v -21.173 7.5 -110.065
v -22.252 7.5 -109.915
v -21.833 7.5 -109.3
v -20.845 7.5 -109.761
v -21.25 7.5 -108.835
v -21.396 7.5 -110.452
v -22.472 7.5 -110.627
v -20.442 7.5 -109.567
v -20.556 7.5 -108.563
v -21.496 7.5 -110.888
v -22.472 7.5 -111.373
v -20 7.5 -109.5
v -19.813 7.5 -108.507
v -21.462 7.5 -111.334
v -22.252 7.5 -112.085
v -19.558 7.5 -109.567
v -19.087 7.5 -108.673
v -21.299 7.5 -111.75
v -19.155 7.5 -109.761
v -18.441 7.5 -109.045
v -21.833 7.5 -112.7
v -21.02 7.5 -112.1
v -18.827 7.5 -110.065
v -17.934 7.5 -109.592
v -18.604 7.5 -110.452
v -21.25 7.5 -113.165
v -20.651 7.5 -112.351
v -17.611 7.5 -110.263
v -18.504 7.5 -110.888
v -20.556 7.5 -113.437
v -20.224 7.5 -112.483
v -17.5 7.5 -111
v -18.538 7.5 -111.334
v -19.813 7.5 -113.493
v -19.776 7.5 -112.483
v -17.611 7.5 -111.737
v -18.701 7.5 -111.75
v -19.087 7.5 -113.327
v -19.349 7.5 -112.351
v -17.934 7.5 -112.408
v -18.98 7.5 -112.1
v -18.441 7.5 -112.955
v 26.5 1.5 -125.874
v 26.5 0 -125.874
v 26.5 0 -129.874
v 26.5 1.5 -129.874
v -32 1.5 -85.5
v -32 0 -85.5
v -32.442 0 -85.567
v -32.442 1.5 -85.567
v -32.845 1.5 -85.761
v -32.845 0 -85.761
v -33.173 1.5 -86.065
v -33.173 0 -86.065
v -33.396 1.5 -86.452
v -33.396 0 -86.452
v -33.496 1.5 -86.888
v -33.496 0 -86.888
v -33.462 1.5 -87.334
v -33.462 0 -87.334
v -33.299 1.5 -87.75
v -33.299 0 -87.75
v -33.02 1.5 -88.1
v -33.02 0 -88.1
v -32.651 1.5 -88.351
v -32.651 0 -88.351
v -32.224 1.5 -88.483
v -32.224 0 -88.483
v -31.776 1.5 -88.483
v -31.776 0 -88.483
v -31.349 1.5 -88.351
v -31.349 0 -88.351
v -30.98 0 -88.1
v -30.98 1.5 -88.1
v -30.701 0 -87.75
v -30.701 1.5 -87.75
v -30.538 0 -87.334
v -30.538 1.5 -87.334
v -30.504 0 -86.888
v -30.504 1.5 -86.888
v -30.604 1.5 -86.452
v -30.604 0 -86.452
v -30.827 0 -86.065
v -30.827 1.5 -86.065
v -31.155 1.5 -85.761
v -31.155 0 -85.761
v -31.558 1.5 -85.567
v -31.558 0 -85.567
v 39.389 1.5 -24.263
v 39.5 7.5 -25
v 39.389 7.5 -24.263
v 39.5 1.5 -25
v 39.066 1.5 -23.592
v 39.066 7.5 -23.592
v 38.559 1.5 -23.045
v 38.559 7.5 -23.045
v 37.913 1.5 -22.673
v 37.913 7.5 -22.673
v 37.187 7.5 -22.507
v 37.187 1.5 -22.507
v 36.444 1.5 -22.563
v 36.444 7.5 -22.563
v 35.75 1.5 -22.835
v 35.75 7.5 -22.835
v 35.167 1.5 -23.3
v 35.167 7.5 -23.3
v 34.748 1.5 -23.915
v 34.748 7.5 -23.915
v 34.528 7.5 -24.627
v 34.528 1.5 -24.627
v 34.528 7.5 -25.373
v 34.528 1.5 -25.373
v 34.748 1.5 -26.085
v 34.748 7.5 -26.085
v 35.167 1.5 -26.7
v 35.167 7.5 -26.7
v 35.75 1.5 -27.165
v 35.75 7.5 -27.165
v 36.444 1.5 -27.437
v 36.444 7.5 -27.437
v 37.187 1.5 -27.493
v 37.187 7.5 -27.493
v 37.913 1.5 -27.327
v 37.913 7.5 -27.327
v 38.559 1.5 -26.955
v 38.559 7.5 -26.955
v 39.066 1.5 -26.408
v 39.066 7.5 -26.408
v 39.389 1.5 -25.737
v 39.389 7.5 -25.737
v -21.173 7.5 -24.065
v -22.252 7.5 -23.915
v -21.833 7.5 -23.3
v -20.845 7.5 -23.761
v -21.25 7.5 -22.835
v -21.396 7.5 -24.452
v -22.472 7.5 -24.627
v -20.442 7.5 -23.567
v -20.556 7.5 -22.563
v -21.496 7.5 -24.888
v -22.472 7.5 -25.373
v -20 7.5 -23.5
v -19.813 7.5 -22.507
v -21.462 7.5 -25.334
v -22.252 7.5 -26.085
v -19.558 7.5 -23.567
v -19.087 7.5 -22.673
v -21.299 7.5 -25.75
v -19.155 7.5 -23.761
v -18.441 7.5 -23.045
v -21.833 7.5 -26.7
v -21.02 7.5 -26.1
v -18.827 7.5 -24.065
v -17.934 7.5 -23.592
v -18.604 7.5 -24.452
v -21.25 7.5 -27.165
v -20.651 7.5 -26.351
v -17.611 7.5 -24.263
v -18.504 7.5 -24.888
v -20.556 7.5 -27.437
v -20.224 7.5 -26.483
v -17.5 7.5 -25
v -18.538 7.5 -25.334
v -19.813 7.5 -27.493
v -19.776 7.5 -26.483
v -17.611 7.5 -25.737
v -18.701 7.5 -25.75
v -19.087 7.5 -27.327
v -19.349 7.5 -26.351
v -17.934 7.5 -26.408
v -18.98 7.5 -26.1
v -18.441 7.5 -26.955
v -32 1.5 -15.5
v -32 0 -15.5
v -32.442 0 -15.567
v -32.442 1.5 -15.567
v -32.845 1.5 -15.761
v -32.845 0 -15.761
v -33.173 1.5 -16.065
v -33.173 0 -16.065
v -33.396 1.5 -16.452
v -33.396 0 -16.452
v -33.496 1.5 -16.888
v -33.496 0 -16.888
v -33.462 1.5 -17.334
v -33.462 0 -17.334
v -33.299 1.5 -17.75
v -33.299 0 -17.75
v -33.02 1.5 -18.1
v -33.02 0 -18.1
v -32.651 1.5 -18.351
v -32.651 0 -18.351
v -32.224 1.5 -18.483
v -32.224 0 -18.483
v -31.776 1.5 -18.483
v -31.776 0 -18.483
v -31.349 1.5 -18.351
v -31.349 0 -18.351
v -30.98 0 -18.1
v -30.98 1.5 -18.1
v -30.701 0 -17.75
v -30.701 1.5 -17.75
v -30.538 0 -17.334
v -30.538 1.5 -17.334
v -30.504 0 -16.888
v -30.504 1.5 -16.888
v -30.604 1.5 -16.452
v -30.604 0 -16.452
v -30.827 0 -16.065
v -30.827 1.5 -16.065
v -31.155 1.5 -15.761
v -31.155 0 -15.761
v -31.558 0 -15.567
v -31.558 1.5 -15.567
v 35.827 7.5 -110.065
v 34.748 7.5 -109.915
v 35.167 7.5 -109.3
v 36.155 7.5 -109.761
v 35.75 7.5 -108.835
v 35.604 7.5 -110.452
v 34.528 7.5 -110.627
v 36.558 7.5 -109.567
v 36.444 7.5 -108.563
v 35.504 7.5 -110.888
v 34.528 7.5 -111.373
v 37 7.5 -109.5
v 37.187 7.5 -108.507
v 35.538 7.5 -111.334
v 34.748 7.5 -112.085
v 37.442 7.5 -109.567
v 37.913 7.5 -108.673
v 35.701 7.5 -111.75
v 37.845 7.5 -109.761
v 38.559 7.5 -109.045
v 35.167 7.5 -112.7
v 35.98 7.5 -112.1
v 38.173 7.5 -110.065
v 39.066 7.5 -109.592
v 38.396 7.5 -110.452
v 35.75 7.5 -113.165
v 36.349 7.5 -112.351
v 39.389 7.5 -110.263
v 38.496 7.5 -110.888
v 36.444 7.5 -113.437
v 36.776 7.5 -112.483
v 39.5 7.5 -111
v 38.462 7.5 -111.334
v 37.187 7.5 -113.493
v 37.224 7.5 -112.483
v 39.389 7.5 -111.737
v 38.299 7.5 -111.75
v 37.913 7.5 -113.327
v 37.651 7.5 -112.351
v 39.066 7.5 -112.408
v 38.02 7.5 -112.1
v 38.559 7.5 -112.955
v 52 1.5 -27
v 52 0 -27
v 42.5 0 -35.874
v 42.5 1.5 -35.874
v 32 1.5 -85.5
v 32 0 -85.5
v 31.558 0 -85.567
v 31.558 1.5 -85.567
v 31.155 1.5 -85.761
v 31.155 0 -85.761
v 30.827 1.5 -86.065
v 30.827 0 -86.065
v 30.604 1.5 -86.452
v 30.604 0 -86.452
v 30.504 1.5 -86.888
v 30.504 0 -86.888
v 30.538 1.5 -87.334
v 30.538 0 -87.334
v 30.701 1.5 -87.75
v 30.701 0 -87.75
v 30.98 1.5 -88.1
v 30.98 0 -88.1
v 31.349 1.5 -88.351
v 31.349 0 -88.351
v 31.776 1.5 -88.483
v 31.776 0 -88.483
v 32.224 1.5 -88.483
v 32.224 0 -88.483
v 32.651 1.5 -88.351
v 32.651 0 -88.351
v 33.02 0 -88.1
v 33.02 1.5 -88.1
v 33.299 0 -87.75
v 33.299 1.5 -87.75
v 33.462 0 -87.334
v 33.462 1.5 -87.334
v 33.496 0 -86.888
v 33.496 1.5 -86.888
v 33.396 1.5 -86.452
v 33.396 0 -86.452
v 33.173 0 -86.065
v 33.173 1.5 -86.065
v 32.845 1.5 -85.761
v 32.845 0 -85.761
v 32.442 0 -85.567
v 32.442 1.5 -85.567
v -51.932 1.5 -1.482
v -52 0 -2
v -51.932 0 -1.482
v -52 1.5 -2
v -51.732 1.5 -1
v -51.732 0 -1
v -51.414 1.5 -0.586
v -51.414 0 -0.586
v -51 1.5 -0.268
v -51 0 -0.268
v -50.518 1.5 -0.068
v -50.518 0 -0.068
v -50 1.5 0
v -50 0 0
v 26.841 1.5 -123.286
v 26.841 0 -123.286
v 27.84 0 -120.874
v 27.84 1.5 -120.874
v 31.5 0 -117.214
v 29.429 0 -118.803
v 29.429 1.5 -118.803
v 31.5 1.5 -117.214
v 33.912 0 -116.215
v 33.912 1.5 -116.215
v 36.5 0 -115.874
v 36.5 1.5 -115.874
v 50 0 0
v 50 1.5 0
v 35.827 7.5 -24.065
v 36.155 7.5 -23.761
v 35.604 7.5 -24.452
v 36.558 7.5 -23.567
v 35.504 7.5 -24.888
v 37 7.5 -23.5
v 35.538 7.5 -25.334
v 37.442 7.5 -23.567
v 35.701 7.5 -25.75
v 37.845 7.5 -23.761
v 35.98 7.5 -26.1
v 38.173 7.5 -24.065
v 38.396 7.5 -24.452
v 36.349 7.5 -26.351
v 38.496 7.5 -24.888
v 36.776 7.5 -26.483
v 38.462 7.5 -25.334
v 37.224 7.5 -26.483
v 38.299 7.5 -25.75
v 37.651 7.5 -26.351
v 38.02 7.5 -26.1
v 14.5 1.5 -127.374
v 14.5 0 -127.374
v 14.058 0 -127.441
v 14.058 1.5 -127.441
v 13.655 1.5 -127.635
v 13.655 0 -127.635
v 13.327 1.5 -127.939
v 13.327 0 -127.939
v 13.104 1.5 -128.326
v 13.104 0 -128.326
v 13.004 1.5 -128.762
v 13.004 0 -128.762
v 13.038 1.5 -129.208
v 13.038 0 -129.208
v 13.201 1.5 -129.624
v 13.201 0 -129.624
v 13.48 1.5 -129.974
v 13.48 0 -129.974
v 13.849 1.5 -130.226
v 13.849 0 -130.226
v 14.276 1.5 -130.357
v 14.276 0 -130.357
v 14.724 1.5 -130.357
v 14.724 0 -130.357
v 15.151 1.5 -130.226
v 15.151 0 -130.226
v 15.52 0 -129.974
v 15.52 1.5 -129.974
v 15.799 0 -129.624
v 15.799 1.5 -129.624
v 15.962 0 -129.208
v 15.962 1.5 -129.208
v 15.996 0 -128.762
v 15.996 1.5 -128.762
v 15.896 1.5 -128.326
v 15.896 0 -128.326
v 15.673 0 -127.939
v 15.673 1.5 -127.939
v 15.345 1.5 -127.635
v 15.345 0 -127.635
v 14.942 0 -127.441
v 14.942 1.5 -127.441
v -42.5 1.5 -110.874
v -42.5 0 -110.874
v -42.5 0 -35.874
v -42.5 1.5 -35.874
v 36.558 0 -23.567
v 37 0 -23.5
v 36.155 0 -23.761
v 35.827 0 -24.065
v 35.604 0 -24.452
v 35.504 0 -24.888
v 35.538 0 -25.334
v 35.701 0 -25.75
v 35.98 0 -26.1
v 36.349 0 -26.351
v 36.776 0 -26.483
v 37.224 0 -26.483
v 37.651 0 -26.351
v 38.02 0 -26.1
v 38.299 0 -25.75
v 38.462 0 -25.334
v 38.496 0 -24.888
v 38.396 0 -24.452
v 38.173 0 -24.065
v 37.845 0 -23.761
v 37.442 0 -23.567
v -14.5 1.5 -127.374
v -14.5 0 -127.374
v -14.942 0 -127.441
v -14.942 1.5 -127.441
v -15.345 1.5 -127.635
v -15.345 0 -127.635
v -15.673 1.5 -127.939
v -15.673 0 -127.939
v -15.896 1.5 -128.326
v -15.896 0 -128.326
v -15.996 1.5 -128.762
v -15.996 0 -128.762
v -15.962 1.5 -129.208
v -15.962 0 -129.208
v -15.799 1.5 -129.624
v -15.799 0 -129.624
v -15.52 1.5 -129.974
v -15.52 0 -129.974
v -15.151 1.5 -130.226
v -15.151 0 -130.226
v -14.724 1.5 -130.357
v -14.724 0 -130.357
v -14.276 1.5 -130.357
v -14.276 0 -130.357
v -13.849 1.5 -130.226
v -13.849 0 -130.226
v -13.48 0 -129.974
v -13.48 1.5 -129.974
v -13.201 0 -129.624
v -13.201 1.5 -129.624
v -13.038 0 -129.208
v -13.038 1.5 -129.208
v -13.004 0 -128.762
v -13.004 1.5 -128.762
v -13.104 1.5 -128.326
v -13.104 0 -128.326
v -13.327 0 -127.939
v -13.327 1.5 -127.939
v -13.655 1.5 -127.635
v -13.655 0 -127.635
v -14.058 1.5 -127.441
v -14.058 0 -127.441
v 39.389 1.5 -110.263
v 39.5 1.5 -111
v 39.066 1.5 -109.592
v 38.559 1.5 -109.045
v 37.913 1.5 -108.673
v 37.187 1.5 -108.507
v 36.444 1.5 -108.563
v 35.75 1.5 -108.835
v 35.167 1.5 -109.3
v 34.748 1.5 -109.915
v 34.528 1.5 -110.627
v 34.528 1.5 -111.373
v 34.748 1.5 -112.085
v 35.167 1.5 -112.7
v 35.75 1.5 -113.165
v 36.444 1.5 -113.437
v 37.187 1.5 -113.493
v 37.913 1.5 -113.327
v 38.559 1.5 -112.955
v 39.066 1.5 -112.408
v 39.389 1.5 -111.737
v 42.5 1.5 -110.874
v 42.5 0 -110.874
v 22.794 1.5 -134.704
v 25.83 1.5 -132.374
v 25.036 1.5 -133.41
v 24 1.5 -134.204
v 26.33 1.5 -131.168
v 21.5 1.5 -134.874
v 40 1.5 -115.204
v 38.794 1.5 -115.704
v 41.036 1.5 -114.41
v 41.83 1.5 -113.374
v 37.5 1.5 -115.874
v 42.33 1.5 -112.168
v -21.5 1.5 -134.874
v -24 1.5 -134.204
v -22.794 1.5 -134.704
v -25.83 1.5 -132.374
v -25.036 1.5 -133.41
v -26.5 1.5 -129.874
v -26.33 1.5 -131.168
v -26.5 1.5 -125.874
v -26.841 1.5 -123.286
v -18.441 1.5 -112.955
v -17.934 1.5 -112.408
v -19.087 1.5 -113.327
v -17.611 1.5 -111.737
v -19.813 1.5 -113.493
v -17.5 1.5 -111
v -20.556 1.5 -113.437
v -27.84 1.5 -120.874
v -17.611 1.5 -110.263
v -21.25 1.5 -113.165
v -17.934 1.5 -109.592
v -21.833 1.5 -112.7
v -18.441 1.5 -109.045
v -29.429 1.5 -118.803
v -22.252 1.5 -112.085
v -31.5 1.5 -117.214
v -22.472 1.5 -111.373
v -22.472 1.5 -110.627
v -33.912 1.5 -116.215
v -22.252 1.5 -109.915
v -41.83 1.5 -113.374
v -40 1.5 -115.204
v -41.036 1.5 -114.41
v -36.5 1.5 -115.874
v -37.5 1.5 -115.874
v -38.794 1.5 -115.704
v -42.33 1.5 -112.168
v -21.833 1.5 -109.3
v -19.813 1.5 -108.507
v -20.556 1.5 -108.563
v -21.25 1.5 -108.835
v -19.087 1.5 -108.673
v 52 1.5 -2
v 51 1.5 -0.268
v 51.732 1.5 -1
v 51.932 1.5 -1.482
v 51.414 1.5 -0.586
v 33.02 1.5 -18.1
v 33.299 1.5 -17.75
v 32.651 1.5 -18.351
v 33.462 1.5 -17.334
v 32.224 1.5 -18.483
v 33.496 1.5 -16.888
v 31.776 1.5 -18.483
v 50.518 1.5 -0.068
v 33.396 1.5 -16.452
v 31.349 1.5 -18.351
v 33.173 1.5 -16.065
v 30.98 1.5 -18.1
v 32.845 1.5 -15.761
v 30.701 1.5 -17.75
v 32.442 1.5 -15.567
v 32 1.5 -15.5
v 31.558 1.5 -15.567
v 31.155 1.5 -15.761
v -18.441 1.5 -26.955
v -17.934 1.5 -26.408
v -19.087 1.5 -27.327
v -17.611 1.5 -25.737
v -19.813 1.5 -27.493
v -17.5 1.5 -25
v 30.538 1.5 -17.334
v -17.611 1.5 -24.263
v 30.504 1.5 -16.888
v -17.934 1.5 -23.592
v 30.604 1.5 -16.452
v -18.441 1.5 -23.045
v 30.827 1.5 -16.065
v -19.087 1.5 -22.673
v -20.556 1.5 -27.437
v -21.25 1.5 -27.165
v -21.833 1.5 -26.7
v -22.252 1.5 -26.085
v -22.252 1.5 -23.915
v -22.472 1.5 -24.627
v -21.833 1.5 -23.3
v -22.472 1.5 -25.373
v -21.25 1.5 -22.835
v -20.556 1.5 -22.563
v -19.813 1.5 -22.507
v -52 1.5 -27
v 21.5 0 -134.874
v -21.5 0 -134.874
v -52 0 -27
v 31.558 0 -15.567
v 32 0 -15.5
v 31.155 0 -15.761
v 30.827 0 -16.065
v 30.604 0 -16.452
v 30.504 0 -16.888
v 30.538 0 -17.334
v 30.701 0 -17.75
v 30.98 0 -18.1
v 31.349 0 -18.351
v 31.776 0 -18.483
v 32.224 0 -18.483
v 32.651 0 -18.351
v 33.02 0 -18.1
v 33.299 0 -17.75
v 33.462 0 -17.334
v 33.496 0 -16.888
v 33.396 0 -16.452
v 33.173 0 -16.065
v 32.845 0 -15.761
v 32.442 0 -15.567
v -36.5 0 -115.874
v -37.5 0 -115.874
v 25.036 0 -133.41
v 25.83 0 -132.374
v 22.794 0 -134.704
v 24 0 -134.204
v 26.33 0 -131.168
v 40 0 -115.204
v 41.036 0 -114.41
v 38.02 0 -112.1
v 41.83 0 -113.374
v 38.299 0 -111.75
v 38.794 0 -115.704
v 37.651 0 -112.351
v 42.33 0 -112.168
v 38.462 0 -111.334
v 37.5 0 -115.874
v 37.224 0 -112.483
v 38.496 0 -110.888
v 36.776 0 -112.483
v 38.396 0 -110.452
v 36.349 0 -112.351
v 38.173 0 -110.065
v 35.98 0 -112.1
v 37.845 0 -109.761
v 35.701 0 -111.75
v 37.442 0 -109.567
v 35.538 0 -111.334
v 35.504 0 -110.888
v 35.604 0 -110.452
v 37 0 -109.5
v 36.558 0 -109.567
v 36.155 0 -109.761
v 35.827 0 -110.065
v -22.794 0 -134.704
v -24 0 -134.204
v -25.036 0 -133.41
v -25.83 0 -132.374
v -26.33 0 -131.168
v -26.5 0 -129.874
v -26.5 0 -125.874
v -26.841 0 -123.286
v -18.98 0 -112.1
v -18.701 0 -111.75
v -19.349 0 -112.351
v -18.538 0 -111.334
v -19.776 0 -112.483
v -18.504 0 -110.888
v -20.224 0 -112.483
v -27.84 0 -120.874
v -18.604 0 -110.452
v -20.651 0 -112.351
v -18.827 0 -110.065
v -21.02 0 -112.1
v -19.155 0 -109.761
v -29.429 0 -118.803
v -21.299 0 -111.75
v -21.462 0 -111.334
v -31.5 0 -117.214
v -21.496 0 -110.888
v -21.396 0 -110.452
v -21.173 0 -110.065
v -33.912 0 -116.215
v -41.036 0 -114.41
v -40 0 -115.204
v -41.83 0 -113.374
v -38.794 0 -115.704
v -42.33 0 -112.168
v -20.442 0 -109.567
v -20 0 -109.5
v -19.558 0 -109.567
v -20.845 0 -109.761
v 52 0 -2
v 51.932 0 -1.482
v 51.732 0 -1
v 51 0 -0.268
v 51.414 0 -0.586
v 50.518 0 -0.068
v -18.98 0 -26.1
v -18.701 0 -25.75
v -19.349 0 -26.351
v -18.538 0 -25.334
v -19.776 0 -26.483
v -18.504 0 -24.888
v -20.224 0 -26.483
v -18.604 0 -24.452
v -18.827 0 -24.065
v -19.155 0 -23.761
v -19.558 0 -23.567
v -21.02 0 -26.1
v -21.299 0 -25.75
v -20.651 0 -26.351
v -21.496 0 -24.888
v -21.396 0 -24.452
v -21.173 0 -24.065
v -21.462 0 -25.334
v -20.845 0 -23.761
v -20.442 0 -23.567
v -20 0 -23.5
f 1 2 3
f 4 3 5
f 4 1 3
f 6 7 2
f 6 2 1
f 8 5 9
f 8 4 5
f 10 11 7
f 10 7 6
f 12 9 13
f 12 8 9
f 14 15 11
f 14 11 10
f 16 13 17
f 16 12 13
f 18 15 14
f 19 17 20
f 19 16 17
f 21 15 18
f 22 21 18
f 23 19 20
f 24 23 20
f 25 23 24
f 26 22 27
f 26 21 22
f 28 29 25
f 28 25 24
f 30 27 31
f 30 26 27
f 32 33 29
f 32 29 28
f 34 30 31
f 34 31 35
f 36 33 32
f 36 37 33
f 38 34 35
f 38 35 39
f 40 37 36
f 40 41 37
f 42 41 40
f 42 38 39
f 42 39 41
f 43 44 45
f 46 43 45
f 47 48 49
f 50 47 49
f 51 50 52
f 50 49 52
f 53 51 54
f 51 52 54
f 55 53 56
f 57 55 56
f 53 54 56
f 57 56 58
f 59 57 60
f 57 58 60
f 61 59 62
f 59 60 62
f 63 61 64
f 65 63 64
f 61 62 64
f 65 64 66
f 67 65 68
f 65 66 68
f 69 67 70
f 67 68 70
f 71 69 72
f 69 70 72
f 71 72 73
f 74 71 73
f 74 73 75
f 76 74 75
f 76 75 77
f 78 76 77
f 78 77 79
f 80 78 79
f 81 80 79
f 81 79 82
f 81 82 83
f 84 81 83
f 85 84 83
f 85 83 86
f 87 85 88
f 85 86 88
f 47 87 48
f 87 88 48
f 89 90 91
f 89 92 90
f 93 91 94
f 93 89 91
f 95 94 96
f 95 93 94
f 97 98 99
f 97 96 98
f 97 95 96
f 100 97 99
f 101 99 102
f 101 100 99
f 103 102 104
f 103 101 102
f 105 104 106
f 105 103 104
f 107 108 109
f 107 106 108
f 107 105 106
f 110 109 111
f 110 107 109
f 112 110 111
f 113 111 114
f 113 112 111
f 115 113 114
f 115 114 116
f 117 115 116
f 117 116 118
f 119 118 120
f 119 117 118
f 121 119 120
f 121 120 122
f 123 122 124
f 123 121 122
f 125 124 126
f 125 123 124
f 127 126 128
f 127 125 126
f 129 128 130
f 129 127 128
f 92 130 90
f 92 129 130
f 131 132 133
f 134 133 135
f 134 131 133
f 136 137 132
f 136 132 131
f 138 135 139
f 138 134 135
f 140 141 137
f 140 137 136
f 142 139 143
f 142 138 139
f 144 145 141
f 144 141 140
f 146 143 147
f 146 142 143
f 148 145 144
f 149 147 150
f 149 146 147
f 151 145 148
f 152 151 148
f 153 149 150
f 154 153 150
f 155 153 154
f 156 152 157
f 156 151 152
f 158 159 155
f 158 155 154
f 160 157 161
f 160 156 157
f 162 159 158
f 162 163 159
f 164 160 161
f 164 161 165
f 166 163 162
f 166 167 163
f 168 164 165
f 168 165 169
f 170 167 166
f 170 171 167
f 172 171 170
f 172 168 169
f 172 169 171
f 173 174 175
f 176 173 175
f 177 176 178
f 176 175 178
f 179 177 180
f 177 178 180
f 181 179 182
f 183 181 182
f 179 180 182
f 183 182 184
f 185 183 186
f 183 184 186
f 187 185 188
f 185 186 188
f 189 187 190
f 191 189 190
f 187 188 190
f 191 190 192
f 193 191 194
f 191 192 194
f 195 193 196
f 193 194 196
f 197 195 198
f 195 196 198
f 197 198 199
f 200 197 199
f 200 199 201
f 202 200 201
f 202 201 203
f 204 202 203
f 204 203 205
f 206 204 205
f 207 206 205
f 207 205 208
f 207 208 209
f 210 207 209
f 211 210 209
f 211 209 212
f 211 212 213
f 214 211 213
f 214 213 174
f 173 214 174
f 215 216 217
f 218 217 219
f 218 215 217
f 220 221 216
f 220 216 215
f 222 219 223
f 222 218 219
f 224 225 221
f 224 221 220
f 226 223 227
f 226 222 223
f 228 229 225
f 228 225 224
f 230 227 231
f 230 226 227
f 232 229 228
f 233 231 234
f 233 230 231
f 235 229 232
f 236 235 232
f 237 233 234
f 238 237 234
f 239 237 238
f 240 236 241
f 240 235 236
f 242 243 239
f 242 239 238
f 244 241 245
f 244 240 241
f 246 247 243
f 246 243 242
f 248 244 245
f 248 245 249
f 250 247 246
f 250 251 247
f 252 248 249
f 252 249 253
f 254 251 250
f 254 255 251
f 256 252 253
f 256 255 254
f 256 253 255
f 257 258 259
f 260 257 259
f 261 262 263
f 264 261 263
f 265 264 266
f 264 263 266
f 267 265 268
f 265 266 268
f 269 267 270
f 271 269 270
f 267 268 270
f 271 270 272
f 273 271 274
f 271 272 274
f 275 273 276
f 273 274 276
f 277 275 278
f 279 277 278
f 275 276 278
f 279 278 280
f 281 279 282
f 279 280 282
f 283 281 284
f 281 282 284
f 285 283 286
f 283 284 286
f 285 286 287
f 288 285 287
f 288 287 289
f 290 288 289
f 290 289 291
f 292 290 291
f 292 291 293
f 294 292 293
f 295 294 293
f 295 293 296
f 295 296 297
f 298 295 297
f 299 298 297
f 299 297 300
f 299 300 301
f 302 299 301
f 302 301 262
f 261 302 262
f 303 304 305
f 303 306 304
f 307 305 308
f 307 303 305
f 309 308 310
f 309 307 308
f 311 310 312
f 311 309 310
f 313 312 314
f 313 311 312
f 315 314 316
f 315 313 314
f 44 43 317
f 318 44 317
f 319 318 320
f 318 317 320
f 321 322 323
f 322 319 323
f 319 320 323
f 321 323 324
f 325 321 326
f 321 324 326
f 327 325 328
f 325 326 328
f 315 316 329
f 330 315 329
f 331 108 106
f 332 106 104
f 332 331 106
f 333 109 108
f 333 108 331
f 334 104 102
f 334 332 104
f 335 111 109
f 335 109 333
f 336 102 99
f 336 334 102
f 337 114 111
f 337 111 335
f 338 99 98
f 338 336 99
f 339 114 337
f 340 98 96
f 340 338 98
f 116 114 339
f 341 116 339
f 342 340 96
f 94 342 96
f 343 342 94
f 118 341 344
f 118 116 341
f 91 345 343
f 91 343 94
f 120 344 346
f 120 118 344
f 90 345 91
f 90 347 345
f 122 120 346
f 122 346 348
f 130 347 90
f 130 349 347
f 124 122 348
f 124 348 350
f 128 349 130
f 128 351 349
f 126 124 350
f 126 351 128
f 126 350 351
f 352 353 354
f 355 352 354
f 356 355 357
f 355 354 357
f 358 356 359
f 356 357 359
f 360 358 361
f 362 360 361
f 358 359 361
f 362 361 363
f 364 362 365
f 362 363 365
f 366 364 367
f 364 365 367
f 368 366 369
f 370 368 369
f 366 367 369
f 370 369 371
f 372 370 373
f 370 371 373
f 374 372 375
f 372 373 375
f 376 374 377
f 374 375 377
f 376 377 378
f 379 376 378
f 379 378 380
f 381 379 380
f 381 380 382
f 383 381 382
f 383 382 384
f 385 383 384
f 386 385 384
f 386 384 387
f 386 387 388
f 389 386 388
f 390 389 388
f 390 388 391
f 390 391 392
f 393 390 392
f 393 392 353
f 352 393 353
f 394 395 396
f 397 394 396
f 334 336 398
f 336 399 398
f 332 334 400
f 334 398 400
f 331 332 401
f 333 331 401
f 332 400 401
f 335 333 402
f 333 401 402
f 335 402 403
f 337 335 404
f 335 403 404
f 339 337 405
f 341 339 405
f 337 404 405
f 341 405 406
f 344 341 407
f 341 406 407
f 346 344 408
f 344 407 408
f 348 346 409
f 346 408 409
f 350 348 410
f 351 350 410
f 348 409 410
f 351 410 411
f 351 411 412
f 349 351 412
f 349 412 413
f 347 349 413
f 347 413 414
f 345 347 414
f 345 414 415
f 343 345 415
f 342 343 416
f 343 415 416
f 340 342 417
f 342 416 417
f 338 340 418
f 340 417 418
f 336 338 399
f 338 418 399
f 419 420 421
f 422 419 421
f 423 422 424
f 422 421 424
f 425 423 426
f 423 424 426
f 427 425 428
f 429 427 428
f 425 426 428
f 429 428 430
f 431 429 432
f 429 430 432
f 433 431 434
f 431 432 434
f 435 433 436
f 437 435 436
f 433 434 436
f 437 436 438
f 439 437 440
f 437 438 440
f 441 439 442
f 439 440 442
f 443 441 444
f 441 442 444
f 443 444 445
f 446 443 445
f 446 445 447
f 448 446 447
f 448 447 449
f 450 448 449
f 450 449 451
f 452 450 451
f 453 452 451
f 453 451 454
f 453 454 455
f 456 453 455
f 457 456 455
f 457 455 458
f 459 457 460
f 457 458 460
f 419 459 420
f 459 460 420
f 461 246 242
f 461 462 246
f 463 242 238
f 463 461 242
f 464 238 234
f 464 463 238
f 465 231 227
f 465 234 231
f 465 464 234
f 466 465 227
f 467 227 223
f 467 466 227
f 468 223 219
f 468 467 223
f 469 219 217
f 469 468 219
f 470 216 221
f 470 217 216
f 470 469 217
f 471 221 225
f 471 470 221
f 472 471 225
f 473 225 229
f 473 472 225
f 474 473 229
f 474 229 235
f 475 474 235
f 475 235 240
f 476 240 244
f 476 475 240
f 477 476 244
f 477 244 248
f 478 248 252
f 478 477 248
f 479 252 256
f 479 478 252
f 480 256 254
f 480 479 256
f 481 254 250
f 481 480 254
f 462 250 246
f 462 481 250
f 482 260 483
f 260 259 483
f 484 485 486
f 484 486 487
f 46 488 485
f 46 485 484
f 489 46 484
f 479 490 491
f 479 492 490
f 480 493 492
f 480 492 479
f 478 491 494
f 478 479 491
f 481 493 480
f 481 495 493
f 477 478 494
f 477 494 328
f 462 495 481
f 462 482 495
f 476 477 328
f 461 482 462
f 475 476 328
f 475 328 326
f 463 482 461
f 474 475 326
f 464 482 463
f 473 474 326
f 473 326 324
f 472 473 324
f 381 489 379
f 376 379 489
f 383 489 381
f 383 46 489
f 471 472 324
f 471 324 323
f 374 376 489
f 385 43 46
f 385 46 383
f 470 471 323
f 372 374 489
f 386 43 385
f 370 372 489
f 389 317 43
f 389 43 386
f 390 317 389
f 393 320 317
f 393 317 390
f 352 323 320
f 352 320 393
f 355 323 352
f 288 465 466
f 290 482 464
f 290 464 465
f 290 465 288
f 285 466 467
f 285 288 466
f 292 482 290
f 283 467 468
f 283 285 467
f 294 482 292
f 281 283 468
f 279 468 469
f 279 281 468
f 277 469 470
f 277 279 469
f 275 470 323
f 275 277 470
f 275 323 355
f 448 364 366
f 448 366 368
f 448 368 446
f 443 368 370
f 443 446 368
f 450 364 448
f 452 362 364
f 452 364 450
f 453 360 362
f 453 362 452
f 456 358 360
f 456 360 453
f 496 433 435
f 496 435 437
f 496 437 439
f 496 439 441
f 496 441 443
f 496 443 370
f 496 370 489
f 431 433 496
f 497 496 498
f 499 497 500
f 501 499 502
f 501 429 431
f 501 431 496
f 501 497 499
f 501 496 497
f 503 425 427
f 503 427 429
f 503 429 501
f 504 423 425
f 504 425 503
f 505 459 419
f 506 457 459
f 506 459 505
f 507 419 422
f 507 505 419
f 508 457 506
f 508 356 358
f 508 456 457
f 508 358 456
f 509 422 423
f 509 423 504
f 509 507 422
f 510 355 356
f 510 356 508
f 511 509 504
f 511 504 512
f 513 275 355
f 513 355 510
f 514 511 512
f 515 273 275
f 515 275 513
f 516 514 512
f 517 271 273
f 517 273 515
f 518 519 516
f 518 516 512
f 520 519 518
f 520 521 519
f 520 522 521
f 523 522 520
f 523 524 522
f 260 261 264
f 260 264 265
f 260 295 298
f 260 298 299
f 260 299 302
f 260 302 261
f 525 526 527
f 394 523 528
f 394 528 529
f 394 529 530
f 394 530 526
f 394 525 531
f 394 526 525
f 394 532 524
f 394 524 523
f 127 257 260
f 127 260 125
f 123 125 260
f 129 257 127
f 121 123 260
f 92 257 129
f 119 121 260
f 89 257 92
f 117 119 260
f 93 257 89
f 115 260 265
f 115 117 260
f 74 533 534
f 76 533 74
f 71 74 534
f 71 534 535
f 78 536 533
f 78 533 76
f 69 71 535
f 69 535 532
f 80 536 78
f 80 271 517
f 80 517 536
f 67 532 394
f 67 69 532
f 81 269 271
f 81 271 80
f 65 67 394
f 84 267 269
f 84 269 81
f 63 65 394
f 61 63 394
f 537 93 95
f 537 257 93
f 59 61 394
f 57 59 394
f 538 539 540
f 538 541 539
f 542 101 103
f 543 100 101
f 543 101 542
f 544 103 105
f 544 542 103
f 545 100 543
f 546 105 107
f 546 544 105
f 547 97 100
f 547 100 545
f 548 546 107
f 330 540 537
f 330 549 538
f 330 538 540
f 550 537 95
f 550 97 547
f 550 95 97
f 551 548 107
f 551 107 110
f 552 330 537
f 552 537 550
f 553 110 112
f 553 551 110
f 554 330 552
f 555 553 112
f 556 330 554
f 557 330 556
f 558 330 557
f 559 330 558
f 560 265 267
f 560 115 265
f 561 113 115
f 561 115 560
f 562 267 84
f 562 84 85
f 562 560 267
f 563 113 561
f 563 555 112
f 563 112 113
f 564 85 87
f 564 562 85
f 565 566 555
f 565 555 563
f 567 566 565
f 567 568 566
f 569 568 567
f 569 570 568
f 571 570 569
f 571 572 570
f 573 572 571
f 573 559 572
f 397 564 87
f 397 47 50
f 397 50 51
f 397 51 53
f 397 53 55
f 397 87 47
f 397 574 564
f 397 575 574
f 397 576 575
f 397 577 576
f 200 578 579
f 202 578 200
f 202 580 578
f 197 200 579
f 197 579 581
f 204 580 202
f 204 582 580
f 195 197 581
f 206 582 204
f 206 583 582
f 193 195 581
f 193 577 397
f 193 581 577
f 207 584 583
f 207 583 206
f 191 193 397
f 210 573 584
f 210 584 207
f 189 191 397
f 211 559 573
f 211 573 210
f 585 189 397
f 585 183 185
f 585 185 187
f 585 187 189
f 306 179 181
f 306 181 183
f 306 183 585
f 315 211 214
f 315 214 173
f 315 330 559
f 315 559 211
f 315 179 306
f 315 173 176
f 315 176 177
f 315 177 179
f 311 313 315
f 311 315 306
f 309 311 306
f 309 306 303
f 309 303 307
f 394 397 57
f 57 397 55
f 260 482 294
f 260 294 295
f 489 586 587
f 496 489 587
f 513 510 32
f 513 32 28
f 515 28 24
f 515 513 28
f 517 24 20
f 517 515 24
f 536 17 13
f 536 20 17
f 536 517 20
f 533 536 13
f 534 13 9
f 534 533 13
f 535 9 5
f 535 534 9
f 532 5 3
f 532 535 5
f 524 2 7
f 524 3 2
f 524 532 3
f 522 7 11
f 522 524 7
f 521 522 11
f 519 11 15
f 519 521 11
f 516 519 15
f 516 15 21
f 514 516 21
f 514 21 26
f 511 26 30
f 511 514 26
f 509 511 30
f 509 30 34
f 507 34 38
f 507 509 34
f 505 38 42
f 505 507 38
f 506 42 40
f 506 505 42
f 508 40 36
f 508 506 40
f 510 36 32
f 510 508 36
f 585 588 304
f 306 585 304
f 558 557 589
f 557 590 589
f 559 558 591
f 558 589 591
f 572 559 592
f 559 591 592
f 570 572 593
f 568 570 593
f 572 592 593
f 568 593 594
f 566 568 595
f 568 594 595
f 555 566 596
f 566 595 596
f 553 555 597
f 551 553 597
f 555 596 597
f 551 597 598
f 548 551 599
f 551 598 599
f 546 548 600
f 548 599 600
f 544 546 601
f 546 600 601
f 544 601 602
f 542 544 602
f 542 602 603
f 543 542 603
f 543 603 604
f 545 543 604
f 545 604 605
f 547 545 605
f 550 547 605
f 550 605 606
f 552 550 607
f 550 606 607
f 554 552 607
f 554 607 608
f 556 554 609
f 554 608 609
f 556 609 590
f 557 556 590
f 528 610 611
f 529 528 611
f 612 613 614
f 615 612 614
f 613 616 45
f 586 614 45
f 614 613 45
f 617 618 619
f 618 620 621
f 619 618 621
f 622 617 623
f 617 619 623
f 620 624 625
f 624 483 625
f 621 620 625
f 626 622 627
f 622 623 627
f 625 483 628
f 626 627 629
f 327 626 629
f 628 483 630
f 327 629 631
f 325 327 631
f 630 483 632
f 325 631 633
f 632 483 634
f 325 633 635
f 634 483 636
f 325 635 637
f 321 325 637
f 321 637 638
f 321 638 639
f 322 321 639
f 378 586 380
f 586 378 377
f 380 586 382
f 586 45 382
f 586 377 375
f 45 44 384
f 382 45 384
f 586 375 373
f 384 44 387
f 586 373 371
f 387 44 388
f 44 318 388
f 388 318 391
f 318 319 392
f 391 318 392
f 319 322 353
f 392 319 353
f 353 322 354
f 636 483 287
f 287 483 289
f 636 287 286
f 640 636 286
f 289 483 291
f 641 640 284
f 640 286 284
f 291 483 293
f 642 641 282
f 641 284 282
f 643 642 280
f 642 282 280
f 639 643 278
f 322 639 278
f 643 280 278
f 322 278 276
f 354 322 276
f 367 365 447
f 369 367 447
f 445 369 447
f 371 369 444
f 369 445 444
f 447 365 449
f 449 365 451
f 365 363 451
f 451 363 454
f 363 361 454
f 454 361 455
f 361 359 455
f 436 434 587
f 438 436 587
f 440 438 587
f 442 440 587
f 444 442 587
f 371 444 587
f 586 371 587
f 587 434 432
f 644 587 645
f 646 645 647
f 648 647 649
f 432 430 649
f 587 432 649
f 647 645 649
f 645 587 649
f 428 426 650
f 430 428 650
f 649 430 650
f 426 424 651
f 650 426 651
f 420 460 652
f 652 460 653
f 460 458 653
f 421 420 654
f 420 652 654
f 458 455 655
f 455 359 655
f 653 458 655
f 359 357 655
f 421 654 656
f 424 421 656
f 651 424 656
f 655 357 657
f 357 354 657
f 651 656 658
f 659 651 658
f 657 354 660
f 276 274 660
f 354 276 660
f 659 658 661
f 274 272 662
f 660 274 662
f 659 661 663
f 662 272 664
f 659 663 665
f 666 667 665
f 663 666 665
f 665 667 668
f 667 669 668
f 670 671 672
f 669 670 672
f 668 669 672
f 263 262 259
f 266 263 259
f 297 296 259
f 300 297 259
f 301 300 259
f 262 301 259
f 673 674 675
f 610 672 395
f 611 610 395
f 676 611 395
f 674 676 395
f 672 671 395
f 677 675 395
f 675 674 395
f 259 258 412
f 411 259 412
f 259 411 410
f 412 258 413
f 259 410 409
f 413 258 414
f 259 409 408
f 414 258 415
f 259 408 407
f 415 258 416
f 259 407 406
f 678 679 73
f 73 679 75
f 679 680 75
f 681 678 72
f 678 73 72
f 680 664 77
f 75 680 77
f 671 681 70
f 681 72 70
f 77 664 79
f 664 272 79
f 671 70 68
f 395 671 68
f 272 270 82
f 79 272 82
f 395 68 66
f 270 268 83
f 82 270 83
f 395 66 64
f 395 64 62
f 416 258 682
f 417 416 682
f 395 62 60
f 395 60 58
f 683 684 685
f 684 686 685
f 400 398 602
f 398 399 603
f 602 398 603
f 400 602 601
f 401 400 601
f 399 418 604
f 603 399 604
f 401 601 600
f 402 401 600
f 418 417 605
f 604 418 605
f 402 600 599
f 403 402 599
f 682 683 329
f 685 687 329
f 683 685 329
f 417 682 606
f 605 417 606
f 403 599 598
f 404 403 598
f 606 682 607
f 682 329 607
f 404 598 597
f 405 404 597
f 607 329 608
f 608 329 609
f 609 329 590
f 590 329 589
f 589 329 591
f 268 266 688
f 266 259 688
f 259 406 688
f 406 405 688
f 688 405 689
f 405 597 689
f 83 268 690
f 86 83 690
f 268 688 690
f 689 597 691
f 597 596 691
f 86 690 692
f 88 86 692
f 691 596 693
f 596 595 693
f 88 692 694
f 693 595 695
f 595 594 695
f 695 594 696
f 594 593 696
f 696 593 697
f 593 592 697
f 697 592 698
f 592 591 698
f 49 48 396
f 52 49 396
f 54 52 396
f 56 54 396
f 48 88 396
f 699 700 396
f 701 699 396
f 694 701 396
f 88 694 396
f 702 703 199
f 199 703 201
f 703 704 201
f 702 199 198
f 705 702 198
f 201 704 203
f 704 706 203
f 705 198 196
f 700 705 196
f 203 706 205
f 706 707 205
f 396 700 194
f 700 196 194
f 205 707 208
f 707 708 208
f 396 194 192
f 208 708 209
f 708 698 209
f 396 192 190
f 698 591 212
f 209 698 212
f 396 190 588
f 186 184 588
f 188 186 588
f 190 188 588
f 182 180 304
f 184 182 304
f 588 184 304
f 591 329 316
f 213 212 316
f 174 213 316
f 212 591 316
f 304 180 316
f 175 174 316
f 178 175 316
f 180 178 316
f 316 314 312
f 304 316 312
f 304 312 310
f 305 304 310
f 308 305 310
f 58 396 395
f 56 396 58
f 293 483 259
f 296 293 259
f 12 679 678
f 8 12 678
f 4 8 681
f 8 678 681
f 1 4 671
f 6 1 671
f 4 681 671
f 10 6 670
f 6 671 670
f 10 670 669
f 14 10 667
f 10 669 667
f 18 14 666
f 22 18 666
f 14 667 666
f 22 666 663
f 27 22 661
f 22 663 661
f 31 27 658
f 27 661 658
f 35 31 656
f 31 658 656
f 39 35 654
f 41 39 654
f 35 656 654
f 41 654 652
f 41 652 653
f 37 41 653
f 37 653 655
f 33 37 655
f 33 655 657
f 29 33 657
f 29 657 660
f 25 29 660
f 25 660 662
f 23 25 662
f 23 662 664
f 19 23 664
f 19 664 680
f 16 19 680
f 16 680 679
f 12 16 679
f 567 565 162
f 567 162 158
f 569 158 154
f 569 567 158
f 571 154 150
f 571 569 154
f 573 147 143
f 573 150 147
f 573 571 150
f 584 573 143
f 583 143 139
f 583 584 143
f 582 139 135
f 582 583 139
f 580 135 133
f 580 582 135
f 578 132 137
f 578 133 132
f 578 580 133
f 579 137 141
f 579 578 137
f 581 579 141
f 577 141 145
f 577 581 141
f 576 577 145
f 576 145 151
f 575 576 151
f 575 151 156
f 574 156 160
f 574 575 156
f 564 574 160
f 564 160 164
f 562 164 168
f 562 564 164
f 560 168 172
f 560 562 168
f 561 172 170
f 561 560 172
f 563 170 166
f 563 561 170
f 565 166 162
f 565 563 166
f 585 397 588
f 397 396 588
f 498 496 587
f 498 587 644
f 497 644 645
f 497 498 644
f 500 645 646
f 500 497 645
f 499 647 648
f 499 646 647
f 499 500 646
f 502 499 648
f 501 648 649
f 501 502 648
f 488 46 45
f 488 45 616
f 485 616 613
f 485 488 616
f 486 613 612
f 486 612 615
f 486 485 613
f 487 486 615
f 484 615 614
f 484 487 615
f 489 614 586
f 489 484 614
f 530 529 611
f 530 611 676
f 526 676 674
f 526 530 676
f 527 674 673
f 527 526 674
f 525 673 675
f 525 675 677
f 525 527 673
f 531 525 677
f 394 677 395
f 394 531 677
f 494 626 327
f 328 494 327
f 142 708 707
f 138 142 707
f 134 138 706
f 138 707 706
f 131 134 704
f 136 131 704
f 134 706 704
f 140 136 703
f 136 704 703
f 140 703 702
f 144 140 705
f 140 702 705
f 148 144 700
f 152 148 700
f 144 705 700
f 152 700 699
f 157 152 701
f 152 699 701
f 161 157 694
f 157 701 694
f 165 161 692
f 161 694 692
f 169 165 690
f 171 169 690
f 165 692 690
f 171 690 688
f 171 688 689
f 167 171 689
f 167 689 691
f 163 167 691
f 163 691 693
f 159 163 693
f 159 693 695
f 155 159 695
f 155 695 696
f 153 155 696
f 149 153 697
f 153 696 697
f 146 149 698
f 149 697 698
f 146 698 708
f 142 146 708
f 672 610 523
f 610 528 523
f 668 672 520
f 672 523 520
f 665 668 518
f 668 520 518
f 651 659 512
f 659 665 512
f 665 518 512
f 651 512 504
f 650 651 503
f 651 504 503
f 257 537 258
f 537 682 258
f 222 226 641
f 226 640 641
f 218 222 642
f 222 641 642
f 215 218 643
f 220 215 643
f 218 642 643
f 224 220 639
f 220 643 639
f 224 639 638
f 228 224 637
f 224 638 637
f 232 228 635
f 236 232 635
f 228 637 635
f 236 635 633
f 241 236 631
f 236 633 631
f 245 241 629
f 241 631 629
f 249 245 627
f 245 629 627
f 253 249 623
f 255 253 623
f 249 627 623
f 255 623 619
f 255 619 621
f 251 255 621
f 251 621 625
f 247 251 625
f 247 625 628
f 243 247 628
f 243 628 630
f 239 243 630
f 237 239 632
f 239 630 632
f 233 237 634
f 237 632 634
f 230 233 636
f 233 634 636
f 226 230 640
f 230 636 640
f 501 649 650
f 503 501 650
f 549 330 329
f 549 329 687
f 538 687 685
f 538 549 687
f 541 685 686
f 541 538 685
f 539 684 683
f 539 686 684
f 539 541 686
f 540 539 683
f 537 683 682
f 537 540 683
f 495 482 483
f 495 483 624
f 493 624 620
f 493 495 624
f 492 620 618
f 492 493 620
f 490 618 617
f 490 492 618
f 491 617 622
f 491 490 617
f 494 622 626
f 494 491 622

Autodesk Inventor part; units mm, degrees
sketch "Skizze1" plane through (0, 0, 0) normal (0, 1, 0) x (-1, 0, 0)
  line L0 (0, 0) -> (-52, 0)
  line L1 (-52, 0) -> (-52, -27)
  line L2 (-52, -27) -> (-42.5, -35.8741)
  line L3 (-42.5, -35.8741) -> (-42.5, -115.8741)
  line L4 (-42.5, -115.8741) -> (-26.5, -115.8741)
  line L5 (-26.5, -115.8741) -> (-26.5, -134.8741)
  line L6 (-26.5, -134.8741) -> (0, -134.8741)
  line L7 (0, -134.8741) -> (0, 0)
  dimension "d2" = 52
  dimension "d3" = 27
  dimension "d4" = 13
  dimension "d8" = 80
  dimension "d9" = 16
  dimension "d10" = 19
  dimension "d11" = 42.5
  dimension "d12" = 26.5
  dimension "d13" = 134.8741
extrude "Extrusion1" add sketch "Skizze1" along normal blind 1.5
fillet "Rundung1" radius 2 1 edges at (52, 0.75, 0)
fillet "Rundung2" radius 10 1 edges at (26.5, 0.75, -115.8741)
fillet "Rundung3" radius 5 1 edges at (42.5, 0.75, -115.8741)
fillet "Rundung4" radius 5 1 edges at (26.5, 0.75, -134.8741)
mirror "Spiegeln1" about plane through (0, 0, 0) normal (1, 0, 0) of "Extrusion1"
mirror "Spiegeln2" about plane through (0, 0, 0) normal (1, 0, 0) of "Rundung2", "Rundung4", "Rundung3", "Rundung1"
sketch "Skizze2" plane through (0, 1.5, 0) normal (0, 1, 0) x (1, 0, 0)
  line L0 (-26.5, 125.8741) -> (-26.5, 129.8741) projected
  line L1 (21.5, 134.8741) -> (-21.5, 134.8741) projected
  line L2 (26.5, 125.8741) -> (26.5, 129.8741) projected
  point P0 (0, 0)
  point P1 (14.5, 128.8741)
  point P2 (-14.5, 128.8741)
  dimension "d20" = 12
  dimension "d21" = 6
  dimension "d22" = 6
  dimension "d23" = 12
hole "Bohrung1" at (14.5, 1.5, -128.8741) at (-14.5, 1.5, -128.8741) direction (0, -1, 0) diameter 3 end through all
sketch "Skizze3" plane through (0, 1.5, 0) normal (0, 1, 0) x (1, 0, 0)
  line L0 (-52, 2) -> (-52, 27) projected
  line L1 (50, 0) -> (-50, 0) projected
  line L2 (52, 2) -> (52, 27) projected
  point P0 (0, 0)
  point P1 (32, 17)
  point P2 (-32, 17)
  point P3 (-32, 87)
  point P4 (32, 87)
  dimension "d31" = 20
  dimension "d32" = 17
  dimension "d33" = 20
  dimension "d34" = 17
  dimension "d42" = 70
  dimension "d43" = 70
  dimension "d44" = 20
  dimension "d45" = 20
hole "Bohrung3" at (32, 1.5, -17) at (-32, 1.5, -17) at (-32, 1.5, -87) at (32, 1.5, -87) direction (0, -1, 0) diameter 3 end through all
sketch "Skizze4" plane through (0, 1.5, 0) normal (0, 1, 0) x (1, 0, 0)
  circle A0 centre (37, 25) radius 2.5
  line L0 (50, 0) -> (-50, 0) projected
  line L1 (52, 2) -> (52, 27) projected
  circle A1 centre (37, 111) radius 2.5
  circle A2 centre (-20, 25) radius 2.5
  circle A3 centre (-20, 111) radius 2.5
  point P0 (0, 0)
  dimension "d53" = 5
  dimension "d54" = 25
  dimension "d55" = 15
  dimension "d56" = 5
  dimension "d57" = 86
  dimension "d58" = 15
  dimension "d59" = 5
  dimension "d60" = 25
  dimension "d61" = 57
  dimension "d62" = 5
  dimension "d63" = 57
  dimension "d64" = 86
extrude "Extrusion2" add sketch "Skizze4" along normal blind 6
sketch "Skizze5" plane through (-20, 7.5, -25) normal (0, 1, 0) x (1, 0, 0)
  circle A0 centre (57, 0) radius 2.5 projected
  circle A1 centre (57, 86) radius 2.5 projected
  circle A2 centre (0, 0) radius 2.5 projected
  circle A3 centre (0, 86) radius 2.5 projected
  point P0 (20, -25)
  dimension "d68" = 0
  dimension "d69" = 0
  dimension "d70" = 0
  dimension "d71" = 0
  dimension "d72" = 0
  dimension "d73" = 0
  dimension "d74" = 0
  dimension "d75" = 0
hole "Bohrung4" at (37, 7.5, -111) at (37, 7.5, -25) at (-20, 7.5, -25) at (-20, 7.5, -111) direction (0, -1, 0) diameter 3 end through all
thread "Gewinde1" size "M3x0.5" class "6H" standard "ANSI Metric M Profile" full length
thread "Gewinde2" size "M3x0.5" class "6H" standard "ANSI Metric M Profile" full length
thread "Gewinde3" size "M3x0.5" class "6H" standard "ANSI Metric M Profile" full length
thread "Gewinde4" size "M3x0.5" class "6H" standard "ANSI Metric M Profile" full length
ref_plane "Arbeitsebene1" through (0, 0, 0) normal (1, 0, 0) x (0, 1, 0)
properties part number "waveshare_expansion_board"
